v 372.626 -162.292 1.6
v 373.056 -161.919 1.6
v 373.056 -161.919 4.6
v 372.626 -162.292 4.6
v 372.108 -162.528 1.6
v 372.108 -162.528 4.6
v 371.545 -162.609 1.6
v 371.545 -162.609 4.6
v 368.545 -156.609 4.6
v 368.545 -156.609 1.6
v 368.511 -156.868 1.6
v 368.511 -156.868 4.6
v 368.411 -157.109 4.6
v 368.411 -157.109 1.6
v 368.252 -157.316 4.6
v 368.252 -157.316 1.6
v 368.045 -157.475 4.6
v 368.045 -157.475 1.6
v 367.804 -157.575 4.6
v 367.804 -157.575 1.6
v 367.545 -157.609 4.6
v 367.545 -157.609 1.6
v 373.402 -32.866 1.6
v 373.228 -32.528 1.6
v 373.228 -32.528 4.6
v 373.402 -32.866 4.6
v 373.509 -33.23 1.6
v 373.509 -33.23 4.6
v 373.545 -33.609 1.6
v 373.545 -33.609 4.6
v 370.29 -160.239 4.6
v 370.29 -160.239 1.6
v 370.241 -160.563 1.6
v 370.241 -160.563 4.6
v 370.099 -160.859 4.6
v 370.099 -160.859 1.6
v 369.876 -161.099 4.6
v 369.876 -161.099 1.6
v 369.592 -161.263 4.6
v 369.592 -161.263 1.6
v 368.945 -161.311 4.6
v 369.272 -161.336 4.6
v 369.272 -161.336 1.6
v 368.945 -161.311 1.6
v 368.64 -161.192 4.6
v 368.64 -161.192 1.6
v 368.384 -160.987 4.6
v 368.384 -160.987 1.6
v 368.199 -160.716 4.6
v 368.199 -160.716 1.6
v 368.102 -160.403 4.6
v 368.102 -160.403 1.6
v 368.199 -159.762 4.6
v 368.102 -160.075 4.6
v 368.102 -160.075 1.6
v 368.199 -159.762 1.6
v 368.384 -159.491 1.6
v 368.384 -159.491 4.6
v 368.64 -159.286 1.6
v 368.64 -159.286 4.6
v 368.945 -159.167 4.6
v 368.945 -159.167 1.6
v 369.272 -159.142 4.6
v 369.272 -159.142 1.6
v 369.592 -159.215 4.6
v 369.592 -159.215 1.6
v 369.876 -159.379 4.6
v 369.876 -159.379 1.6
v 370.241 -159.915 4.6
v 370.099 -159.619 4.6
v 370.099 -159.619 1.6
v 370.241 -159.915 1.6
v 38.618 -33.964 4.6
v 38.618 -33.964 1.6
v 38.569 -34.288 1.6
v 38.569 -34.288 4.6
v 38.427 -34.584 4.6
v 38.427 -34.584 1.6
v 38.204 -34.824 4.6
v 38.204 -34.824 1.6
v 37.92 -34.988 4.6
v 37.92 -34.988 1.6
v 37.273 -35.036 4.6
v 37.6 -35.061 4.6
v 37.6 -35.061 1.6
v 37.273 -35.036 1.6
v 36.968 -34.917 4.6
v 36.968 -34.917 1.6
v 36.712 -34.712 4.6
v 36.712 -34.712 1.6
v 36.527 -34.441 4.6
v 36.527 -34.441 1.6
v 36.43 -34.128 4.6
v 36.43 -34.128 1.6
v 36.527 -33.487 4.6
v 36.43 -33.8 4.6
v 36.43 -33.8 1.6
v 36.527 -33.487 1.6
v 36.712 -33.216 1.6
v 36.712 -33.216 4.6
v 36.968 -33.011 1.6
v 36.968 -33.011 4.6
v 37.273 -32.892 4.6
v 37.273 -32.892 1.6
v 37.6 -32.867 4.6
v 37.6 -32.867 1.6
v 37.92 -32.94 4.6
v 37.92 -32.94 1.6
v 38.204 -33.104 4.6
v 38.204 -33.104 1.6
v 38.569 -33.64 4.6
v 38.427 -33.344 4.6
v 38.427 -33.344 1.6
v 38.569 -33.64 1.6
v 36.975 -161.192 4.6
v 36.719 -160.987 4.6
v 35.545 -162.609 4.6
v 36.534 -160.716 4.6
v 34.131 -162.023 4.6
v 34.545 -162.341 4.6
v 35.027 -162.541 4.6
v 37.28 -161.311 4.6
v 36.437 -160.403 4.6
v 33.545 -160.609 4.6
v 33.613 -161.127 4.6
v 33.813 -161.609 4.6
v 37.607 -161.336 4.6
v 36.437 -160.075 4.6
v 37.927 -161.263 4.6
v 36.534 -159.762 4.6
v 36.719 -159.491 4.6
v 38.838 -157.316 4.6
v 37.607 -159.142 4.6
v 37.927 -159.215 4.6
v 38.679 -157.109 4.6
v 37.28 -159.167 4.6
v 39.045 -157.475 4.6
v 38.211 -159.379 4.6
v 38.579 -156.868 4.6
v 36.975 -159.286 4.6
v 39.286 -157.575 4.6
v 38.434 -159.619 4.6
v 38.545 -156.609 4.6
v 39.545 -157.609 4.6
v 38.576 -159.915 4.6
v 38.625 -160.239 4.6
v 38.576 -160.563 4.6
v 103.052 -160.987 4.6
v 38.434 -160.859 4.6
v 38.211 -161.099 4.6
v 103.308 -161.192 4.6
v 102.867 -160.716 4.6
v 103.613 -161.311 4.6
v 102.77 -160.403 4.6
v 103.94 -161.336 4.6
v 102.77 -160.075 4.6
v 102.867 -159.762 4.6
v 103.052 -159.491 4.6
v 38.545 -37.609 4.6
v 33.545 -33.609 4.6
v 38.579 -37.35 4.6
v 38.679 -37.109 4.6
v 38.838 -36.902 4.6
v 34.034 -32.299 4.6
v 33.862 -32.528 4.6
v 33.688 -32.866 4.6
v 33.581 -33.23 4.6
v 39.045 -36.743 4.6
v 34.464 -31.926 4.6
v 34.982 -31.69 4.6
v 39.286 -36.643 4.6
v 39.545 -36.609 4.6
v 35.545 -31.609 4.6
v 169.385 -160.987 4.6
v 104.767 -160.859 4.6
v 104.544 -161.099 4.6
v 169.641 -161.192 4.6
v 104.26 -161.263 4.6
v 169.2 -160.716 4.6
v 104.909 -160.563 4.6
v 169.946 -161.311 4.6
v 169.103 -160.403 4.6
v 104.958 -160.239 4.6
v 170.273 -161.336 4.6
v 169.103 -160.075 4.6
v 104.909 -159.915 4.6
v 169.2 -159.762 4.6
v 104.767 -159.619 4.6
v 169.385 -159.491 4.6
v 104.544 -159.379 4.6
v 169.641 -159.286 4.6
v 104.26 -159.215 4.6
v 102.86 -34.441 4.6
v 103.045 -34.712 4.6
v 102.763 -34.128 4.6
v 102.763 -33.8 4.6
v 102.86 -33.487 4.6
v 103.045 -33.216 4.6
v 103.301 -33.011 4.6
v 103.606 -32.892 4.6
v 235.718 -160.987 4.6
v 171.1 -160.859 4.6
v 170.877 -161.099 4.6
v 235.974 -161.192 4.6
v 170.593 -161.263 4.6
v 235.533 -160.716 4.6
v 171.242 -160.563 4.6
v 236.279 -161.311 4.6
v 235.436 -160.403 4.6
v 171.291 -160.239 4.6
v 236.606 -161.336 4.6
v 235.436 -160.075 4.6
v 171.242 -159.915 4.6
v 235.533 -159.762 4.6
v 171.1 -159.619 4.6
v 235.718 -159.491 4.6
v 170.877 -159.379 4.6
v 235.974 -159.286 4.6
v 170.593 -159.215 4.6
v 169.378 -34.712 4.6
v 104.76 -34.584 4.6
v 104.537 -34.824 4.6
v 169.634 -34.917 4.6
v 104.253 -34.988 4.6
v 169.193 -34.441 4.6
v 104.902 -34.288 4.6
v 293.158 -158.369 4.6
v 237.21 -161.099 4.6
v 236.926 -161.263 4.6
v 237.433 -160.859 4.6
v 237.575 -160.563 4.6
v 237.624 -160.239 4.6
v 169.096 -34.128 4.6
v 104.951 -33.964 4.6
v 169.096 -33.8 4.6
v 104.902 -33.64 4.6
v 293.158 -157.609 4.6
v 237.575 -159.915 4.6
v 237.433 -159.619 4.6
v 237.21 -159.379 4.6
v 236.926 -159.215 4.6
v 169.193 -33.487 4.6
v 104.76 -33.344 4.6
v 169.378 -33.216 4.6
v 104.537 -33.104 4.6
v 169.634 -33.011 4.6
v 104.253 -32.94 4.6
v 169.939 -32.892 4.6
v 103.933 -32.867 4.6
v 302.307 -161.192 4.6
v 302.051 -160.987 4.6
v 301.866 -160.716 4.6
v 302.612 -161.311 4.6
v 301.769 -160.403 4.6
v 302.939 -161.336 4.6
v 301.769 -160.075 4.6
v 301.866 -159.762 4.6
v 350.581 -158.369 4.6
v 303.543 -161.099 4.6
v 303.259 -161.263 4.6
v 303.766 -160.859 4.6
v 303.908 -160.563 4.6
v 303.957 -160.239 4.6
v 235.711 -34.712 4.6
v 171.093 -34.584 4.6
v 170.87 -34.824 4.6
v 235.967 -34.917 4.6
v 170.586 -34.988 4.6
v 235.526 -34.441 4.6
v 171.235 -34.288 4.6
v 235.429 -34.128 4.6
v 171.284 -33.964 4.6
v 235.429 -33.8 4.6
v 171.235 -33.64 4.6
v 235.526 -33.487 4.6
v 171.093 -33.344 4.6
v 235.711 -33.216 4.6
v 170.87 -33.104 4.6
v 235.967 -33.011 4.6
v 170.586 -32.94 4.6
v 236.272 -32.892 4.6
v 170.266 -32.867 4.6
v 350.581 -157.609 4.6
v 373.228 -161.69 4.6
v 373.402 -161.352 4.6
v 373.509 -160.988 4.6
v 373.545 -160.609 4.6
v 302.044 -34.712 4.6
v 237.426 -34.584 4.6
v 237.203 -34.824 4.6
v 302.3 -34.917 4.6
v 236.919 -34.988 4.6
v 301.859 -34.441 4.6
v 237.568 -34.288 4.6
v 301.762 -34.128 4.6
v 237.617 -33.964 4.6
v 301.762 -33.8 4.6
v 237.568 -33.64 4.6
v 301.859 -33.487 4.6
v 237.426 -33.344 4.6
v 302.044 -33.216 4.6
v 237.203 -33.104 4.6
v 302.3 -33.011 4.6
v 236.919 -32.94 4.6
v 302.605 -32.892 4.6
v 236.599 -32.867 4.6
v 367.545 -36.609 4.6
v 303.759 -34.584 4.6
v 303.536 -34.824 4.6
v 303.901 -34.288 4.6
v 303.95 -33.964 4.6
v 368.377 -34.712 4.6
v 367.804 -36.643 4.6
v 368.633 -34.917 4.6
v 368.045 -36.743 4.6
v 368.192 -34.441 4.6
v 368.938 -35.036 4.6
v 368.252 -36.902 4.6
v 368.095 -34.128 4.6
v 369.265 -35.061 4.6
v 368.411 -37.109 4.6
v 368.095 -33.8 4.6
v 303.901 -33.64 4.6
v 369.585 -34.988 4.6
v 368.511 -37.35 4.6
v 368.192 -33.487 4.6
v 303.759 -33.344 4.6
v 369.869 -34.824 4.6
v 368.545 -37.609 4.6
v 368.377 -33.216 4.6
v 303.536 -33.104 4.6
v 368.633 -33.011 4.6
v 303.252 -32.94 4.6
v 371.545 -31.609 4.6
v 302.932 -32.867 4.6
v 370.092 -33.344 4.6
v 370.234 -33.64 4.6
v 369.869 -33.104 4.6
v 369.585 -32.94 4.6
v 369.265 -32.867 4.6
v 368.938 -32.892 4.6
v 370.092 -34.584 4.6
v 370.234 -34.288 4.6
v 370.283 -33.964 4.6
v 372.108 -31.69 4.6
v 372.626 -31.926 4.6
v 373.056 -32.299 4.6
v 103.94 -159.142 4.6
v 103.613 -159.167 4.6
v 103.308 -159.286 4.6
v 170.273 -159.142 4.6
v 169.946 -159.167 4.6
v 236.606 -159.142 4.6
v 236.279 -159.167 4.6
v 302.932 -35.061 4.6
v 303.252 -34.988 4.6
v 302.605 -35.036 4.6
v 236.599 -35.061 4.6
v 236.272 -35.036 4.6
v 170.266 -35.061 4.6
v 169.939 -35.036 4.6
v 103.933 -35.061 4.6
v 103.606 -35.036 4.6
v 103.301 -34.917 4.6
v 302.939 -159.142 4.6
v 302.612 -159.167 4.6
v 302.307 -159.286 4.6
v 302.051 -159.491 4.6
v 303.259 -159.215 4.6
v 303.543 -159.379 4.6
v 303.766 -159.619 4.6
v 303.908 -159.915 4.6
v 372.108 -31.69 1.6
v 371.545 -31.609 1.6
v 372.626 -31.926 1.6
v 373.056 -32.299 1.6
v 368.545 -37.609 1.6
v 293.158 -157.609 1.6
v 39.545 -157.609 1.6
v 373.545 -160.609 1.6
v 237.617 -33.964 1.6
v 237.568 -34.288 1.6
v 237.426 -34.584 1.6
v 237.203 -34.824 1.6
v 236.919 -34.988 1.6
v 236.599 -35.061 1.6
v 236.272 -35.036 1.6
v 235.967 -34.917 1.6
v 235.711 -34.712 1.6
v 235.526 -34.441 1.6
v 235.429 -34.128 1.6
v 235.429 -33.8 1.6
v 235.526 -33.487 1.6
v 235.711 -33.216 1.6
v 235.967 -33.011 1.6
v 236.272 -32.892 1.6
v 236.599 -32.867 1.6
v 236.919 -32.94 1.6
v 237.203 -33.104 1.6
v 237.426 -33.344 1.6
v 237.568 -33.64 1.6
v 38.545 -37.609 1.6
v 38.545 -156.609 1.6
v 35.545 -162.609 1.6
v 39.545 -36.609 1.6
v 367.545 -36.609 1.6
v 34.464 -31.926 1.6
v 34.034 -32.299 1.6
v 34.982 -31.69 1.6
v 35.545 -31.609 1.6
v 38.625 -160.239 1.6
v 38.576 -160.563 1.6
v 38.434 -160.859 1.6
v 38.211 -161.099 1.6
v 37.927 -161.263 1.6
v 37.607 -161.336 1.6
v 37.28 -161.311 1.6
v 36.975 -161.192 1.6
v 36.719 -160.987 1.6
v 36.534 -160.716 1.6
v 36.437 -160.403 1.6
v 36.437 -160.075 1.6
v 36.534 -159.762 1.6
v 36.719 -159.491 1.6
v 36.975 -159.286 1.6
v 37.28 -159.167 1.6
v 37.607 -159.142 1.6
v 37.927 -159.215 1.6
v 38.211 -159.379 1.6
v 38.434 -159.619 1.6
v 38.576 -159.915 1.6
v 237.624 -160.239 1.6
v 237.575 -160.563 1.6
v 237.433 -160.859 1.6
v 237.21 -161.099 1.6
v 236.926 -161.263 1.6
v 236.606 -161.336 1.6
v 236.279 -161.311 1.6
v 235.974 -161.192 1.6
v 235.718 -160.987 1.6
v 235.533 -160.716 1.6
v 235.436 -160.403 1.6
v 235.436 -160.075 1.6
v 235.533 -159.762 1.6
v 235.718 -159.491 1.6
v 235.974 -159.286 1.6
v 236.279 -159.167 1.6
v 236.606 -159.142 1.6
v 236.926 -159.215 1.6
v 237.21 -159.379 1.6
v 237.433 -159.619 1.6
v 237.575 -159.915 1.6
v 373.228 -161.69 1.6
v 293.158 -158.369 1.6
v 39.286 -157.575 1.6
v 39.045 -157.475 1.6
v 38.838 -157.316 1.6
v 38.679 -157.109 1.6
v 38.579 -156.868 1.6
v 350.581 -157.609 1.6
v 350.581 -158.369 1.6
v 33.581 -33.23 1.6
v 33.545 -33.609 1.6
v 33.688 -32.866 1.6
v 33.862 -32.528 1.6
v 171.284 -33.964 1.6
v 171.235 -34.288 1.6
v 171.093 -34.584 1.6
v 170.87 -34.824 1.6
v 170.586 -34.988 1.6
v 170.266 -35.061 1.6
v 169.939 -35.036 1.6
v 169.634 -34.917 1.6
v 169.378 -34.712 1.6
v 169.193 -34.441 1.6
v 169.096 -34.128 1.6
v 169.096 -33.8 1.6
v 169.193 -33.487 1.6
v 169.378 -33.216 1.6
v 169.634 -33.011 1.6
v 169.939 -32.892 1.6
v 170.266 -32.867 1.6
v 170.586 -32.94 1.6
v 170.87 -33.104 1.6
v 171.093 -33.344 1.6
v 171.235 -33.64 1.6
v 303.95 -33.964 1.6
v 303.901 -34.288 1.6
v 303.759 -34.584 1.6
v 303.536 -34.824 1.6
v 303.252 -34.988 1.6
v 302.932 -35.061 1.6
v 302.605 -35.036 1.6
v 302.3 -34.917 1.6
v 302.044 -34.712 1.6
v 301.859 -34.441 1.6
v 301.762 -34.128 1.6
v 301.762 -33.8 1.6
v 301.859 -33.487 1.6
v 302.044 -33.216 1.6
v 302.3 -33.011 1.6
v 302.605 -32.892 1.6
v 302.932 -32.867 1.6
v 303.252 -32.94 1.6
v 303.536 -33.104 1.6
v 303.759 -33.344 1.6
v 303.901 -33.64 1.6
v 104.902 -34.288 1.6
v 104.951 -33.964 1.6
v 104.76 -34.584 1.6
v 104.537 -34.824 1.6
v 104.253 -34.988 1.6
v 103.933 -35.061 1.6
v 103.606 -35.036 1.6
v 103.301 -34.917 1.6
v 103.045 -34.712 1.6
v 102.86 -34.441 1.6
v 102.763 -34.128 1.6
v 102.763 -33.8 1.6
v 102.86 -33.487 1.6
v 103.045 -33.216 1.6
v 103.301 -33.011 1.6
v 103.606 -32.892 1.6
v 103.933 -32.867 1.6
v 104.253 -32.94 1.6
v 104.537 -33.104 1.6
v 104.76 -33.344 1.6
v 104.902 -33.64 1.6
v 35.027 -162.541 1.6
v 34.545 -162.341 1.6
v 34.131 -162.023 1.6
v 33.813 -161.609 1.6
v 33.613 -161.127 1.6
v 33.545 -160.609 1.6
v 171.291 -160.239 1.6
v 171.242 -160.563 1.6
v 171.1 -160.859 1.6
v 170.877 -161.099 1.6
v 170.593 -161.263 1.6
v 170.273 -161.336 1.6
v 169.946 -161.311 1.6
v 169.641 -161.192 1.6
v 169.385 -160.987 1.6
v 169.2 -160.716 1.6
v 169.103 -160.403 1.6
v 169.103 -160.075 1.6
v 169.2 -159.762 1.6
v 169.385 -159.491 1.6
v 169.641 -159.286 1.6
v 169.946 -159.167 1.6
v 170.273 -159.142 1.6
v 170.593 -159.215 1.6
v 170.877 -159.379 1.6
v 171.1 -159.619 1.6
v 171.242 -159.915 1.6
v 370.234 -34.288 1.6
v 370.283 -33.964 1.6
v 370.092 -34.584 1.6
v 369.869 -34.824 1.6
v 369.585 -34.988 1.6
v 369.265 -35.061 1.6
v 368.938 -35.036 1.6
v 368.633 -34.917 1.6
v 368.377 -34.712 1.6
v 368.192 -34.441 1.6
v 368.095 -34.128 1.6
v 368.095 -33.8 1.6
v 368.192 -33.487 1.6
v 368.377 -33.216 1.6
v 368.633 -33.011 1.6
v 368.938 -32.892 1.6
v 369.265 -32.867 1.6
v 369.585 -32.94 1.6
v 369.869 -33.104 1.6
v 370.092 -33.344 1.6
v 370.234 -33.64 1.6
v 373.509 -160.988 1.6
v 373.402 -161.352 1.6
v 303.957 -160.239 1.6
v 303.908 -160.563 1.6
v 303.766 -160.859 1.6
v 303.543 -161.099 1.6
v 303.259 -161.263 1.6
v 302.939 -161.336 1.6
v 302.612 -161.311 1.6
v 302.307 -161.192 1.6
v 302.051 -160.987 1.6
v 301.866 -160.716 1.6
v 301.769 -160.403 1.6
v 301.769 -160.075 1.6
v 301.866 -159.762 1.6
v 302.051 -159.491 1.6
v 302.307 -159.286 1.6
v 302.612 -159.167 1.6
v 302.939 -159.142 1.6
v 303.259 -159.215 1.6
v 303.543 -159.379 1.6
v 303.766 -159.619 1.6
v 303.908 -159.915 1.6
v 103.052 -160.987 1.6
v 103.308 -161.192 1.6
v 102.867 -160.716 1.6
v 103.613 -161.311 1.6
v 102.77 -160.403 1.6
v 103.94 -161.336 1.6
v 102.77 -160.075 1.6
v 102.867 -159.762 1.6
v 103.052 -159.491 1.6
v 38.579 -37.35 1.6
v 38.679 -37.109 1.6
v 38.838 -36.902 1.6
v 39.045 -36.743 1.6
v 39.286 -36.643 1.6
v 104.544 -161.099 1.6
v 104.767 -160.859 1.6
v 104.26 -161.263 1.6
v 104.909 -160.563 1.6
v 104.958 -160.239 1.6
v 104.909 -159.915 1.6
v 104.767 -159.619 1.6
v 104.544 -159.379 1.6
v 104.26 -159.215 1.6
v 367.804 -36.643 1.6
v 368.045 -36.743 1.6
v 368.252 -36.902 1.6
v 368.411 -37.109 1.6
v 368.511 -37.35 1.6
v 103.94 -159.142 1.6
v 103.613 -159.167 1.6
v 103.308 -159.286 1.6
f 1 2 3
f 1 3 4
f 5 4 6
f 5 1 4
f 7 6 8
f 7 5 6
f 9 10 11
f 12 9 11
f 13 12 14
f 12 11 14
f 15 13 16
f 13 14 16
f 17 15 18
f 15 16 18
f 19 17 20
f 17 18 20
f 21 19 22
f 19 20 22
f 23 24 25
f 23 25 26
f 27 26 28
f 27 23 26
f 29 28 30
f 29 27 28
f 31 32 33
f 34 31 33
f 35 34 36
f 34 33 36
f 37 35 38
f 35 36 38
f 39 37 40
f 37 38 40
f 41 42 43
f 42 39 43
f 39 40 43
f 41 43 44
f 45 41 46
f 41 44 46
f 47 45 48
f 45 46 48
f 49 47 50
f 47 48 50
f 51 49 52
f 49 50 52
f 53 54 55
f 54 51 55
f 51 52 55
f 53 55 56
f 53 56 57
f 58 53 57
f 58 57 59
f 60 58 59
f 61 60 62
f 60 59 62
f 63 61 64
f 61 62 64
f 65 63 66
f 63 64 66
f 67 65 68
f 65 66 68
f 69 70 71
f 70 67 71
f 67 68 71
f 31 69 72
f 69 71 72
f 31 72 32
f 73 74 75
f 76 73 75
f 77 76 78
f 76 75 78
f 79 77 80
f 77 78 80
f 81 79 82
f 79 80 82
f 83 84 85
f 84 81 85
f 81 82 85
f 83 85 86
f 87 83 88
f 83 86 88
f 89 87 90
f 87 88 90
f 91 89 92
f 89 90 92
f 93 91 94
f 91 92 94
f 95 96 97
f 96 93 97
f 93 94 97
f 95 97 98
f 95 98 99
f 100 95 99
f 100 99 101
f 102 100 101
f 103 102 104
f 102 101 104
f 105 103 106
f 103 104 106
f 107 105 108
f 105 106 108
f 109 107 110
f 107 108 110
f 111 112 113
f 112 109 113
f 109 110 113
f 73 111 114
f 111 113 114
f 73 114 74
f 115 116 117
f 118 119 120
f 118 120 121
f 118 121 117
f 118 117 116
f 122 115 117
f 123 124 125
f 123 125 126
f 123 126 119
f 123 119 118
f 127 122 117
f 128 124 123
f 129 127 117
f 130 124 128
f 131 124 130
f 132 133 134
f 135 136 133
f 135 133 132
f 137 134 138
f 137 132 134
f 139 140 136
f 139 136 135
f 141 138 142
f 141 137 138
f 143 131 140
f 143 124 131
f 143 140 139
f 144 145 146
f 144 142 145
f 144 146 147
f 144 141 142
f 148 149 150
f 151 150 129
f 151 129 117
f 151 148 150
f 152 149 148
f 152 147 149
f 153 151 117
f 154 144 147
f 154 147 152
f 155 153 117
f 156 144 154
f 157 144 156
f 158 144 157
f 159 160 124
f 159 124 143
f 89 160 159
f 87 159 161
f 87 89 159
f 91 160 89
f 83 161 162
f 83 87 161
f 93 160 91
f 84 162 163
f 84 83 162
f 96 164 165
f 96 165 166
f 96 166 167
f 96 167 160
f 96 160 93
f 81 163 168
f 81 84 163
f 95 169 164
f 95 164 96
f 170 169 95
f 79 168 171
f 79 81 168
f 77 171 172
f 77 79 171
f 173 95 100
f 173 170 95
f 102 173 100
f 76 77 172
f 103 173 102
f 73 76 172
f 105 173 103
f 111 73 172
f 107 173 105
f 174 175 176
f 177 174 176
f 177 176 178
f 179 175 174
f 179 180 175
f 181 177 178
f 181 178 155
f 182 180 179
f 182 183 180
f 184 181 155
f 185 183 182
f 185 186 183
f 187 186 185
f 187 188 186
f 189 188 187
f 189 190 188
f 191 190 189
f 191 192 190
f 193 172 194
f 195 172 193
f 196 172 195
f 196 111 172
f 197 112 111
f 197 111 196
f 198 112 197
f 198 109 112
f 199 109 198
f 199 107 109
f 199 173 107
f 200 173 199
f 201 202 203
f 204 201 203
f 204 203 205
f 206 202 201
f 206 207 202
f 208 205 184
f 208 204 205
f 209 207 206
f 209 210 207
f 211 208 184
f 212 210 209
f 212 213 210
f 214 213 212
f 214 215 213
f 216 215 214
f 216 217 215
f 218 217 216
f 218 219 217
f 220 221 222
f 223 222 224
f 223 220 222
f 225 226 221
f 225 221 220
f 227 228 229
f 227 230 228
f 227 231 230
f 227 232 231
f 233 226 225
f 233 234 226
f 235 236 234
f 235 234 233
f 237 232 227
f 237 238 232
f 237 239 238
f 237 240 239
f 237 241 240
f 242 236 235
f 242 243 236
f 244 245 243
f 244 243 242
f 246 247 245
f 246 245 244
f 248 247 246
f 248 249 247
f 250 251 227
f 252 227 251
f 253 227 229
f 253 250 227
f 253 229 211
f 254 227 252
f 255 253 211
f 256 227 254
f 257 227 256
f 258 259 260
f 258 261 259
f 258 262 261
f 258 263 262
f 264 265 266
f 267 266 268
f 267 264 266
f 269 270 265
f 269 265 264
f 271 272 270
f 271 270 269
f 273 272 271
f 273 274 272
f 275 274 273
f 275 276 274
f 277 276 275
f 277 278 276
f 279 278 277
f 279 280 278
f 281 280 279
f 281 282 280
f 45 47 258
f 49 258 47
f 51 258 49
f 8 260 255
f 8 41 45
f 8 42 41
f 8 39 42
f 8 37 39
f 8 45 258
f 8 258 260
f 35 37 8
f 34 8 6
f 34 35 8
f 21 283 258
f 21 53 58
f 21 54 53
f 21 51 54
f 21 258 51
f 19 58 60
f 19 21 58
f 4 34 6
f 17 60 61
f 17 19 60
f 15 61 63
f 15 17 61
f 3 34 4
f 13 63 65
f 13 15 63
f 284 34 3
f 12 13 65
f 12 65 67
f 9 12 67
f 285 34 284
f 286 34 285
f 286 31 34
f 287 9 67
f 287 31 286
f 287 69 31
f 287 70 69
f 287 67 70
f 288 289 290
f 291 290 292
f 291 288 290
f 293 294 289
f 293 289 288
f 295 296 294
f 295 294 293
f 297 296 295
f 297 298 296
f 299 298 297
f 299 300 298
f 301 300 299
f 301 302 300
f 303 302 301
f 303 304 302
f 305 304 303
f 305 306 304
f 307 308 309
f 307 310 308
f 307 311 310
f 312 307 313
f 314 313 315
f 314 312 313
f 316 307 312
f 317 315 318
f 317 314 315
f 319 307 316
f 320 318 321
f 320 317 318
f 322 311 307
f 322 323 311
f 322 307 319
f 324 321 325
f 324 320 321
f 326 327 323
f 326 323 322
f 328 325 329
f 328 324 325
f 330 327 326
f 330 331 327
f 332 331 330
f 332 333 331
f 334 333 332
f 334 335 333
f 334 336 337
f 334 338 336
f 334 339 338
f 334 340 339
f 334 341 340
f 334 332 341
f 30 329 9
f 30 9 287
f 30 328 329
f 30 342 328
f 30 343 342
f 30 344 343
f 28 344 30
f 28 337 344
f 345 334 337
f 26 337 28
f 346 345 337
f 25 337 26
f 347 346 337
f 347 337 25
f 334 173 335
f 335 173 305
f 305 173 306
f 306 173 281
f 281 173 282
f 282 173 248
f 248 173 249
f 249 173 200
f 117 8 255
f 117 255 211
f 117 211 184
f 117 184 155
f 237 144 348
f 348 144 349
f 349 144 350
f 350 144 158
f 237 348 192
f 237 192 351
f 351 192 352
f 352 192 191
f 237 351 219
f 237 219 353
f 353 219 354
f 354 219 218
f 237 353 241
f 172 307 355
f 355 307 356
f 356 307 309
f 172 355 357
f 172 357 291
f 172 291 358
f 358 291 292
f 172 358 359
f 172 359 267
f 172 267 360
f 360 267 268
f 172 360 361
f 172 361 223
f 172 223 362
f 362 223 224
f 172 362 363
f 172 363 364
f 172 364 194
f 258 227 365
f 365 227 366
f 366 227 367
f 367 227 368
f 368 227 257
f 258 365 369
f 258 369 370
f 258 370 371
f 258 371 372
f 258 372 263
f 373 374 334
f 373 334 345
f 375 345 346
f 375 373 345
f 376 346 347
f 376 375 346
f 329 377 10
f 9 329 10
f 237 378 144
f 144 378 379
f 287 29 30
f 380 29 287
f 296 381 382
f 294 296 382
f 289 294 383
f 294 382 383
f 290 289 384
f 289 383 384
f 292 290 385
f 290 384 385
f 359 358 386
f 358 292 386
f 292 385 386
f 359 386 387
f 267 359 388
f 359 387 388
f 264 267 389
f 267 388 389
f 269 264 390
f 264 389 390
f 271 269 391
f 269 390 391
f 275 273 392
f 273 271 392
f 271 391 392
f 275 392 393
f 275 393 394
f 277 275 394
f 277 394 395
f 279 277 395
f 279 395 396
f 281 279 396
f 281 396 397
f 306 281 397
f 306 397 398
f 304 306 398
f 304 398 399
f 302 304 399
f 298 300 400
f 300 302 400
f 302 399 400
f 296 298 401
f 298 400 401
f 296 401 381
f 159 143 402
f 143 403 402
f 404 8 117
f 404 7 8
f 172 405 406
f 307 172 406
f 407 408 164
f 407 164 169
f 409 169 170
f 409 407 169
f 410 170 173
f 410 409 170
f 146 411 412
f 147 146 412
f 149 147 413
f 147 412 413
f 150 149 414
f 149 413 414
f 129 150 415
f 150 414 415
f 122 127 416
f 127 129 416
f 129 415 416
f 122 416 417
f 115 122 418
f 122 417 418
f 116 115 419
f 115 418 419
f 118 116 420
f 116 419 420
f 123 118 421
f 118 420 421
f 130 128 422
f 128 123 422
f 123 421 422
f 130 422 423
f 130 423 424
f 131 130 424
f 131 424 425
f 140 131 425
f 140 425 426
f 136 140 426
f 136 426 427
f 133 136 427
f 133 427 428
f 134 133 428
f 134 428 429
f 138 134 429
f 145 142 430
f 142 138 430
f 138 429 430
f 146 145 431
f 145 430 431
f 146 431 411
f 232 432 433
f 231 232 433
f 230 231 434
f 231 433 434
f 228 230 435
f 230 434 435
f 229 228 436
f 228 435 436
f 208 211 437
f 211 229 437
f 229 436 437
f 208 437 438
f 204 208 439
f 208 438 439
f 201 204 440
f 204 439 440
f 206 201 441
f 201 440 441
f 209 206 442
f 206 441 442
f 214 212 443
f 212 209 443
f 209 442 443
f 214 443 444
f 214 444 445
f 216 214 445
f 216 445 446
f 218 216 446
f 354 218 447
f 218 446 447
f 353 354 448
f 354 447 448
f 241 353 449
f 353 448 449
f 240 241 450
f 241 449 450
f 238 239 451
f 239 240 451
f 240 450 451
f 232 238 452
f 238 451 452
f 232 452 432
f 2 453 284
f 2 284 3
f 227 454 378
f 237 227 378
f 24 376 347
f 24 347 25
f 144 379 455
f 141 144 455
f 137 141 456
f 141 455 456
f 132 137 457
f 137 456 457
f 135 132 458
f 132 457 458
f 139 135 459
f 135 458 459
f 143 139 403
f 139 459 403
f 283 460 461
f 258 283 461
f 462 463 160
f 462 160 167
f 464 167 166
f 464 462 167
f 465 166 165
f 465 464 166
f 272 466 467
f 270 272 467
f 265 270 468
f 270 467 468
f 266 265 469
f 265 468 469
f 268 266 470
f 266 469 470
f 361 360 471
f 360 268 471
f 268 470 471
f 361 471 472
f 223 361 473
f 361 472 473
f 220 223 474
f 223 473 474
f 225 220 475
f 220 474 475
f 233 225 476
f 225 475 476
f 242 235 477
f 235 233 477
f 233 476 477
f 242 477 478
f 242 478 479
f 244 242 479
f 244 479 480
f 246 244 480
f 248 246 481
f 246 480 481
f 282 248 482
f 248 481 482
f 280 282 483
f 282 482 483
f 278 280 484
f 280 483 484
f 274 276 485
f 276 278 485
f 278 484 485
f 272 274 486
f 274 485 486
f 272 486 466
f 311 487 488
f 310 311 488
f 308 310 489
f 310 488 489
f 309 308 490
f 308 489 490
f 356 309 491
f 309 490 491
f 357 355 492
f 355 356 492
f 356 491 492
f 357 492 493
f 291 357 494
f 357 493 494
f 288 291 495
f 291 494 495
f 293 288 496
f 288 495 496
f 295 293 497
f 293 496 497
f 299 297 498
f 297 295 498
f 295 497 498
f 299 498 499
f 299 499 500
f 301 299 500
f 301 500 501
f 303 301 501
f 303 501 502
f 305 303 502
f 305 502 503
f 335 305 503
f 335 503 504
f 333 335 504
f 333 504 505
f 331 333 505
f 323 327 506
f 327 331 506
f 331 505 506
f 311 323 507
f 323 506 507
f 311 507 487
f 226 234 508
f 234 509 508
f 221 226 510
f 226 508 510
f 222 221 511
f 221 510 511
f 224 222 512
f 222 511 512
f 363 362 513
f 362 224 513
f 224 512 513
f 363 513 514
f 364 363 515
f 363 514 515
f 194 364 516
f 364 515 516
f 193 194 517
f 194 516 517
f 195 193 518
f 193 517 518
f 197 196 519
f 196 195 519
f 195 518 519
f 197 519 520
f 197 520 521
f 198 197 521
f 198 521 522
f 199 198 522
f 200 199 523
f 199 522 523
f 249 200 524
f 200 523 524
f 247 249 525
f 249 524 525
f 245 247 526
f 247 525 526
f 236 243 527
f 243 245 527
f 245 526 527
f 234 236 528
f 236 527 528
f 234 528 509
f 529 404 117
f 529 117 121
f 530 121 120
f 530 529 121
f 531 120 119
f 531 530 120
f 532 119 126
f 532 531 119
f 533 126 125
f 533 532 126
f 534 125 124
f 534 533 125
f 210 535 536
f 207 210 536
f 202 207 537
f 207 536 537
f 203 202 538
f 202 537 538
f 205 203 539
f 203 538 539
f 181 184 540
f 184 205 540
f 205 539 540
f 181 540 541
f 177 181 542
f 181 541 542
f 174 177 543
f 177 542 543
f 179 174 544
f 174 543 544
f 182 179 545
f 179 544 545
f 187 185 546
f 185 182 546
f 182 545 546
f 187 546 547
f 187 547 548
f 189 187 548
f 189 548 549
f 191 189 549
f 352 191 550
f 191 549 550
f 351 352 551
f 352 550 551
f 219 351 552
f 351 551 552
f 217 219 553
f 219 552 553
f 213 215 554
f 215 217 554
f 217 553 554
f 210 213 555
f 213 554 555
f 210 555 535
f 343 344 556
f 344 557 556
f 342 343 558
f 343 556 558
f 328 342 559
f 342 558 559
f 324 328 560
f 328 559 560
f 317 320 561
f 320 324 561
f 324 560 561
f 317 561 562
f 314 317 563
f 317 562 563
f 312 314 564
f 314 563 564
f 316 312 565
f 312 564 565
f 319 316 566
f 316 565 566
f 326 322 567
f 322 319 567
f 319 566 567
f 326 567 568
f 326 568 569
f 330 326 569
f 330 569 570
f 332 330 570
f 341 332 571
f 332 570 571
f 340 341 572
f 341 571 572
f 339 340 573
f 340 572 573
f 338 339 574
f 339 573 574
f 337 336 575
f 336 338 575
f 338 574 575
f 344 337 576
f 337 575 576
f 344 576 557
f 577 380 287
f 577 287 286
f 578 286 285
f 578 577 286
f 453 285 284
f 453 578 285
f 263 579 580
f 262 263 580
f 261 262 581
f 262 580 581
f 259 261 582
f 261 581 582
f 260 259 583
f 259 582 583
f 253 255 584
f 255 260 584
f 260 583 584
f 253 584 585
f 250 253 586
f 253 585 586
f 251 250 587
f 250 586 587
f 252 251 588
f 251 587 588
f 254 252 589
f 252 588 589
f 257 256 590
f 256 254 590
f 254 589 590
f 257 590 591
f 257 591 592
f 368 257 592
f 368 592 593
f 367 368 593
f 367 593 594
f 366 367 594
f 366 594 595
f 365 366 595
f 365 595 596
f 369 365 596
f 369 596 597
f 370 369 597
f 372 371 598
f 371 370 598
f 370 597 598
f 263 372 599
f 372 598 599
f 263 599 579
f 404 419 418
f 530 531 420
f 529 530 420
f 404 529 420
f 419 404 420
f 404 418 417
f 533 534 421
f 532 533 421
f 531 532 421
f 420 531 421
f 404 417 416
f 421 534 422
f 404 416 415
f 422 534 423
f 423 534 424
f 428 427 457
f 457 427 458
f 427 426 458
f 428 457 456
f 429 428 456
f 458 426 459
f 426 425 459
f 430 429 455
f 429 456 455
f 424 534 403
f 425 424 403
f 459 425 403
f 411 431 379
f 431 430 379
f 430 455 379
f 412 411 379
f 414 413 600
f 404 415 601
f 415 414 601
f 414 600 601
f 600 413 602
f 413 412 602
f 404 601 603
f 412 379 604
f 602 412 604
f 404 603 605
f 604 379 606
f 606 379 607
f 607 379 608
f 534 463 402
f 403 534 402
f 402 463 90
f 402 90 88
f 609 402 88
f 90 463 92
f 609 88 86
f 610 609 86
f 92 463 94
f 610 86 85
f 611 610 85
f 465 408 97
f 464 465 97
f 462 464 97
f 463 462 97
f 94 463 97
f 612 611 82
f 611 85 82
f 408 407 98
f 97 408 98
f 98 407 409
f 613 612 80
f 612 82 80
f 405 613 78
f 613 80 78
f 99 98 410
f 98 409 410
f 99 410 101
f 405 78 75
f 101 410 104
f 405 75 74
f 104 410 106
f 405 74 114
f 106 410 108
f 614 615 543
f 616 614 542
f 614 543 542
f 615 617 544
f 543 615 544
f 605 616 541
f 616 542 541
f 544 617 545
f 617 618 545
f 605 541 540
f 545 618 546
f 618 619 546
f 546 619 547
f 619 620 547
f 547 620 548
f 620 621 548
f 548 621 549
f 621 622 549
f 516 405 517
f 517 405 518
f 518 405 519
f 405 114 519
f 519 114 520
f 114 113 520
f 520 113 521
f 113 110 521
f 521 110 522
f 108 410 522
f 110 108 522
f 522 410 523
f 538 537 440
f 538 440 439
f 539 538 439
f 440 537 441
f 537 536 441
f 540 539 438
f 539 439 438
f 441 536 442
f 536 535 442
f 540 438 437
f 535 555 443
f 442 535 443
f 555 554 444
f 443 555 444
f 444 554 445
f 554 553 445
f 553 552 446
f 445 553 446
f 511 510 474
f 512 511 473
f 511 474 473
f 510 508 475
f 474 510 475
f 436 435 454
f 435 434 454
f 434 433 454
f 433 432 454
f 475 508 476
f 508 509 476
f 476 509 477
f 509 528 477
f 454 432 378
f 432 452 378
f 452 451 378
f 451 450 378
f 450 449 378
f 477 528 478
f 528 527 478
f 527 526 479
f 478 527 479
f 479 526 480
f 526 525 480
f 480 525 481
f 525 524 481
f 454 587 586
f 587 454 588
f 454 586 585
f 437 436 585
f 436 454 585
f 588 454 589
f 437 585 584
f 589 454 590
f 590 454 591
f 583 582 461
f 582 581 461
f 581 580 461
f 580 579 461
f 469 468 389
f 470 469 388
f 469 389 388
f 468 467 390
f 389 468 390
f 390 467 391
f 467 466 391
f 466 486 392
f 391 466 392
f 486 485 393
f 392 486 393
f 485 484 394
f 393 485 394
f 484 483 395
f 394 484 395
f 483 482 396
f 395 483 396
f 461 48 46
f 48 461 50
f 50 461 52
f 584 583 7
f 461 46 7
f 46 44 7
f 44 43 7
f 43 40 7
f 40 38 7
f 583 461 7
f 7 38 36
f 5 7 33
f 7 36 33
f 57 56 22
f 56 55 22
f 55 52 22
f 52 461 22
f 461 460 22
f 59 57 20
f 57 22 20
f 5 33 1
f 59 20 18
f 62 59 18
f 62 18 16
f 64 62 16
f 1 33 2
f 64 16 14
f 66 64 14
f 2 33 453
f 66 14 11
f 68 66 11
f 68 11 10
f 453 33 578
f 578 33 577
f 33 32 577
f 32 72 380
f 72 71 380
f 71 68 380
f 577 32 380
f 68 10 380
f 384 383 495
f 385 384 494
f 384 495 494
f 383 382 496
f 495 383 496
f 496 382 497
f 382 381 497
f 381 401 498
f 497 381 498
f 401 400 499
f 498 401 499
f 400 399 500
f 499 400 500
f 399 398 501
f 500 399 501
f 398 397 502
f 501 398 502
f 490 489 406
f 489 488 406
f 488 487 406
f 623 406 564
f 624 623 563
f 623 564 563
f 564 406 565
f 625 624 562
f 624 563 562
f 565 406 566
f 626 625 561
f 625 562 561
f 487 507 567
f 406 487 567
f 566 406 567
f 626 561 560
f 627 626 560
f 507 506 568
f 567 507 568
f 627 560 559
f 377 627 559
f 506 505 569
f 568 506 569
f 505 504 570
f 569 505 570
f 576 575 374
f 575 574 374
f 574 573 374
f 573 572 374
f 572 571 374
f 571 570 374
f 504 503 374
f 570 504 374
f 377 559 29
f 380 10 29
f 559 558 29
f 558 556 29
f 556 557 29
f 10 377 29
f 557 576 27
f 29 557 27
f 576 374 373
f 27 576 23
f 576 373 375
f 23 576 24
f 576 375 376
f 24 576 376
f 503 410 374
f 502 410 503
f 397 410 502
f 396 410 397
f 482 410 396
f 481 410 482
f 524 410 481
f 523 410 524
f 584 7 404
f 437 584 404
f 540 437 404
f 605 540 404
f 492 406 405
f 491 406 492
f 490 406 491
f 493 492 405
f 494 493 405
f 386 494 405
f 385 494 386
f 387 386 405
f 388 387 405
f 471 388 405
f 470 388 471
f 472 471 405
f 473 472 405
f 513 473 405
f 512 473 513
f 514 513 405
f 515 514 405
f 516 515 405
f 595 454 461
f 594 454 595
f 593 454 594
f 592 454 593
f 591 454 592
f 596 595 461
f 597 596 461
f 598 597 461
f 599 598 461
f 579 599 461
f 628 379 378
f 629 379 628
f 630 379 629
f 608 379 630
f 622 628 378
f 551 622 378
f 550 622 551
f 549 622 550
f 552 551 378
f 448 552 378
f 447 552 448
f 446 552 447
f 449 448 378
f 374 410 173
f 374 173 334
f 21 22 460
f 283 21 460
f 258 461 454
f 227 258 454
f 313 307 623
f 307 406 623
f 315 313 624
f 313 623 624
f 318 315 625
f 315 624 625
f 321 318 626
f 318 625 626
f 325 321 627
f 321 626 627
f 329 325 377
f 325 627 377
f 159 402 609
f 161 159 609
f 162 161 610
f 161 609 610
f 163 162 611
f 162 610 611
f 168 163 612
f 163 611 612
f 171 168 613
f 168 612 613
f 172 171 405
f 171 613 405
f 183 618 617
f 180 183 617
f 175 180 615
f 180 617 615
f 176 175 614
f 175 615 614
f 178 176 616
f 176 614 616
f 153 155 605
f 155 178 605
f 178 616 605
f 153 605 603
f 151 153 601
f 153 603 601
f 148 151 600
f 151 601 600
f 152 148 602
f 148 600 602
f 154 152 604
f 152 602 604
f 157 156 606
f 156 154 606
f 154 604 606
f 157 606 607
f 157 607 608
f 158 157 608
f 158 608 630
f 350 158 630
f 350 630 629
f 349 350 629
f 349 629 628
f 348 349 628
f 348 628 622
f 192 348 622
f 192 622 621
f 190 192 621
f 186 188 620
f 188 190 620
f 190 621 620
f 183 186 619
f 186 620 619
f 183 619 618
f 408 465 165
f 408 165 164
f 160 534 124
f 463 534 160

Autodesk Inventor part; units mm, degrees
ref_plane "YZ Plane" through (0, 0, 0) normal (1, 0, 0) x (0, 1, 0)
ref_plane "XZ Plane" through (0, 0, 0) normal (0, 1, 0) x (-1, 0, 0)
ref_plane "XY Plane" through (0, 0, 0) normal (0, 0, 1) x (1, 0, 0)
ref_plane "Work Plane2" through (35.545, -31.609, 1.6) normal (0, 0, 1) x (1, 0, 0)
ref_plane "Work Plane1" through (35.545, -31.609, 1.6) normal (0, 0, 1) x (1, 0, 0)
sketch "Sketch1" plane through (35.545, -31.609, 1.6) normal (0, 0, 1) x (1, 0, 0)
  line L0 (0, 0) -> (336, 0) projected
  line L1 (-2, -129) -> (-2, -2) projected
  line L2 (-1.6825, -0.9187) -> (-1.5115, -0.6903) projected
  arc A0 (0, 0) -> (-2, -2) centre (0, -2) ccw
  line L3 (338, -2) -> (338, -129) projected
  line L4 (337.5115, -0.6903) -> (337.6825, -0.9187) projected
  arc A1 (338, -2) -> (336, 0) centre (336, -2) ccw
  line L5 (336, -131) -> (0, -131) projected
  line L6 (337.6825, -130.0813) -> (337.5115, -130.3097) projected
  arc A2 (336, -131) -> (338, -129) centre (336, -129) ccw
  arc A3 (-2, -129) -> (0, -131) centre (0, -129) ccw
  circle A4 centre (1.98, -128.63) radius 1.1 projected
  circle A5 centre (1.98, -128.63) radius 1.1
  circle A6 centre (68.313, -128.63) radius 1.1 projected
  circle A7 centre (134.646, -128.63) radius 1.1 projected
  circle A8 centre (134.646, -128.63) radius 1.1
  circle A9 centre (68.313, -128.63) radius 1.1
  circle A10 centre (200.979, -128.63) radius 1.1 projected
  circle A11 centre (267.312, -128.63) radius 1.1 projected
  circle A12 centre (333.645, -128.63) radius 1.1 projected
  circle A13 centre (333.645, -128.63) radius 1.1
  circle A14 centre (267.312, -128.63) radius 1.1
  circle A15 centre (200.979, -128.63) radius 1.1
  circle A16 centre (333.638, -2.355) radius 1.1 projected
  circle A17 centre (1.973, -2.355) radius 1.1 projected
  circle A18 centre (68.306, -2.355) radius 1.1 projected
  circle A19 centre (134.639, -2.355) radius 1.1 projected
  circle A20 centre (200.972, -2.355) radius 1.1 projected
  circle A21 centre (267.305, -2.355) radius 1.1 projected
  circle A22 centre (333.645, -2.355) radius 1.093
  circle A23 centre (267.305, -2.355) radius 1.1
  circle A24 centre (200.972, -2.355) radius 1.1
  circle A25 centre (134.639, -2.355) radius 1.1
  circle A26 centre (68.306, -2.355) radius 1.1
  circle A27 centre (1.973, -2.355) radius 1.1
  line L7 (3, -4.2357) -> (125.2758, -4.2357) construction
  line L8 (4, -5) -> (332, -5)
  line L9 (333, -6) -> (333, -125)
  line L10 (332, -126) -> (4, -126)
  line L11 (3, -125) -> (3, -6)
  arc A28 (4, -5) -> (3, -6) centre (4, -6) ccw
  arc A29 (333, -6) -> (332, -5) centre (332, -6) ccw
  arc A30 (332, -126) -> (333, -125) centre (332, -125) ccw
  arc A31 (3, -125) -> (4, -126) centre (4, -125) ccw
  circle A32 centre (320.737, -95.692) radius 0.175 projected
  line L12 (257.6125, -126) -> (315.0362, -126)
  line L13 (315.0362, -126) -> (315.0362, -126.7604)
  line L14 (315.0362, -126.7604) -> (257.6125, -126.7604)
  line L15 (257.6125, -126.7604) -> (257.6125, -126)
  point P0 (-35.545, 31.609)
  point P1 (-1.5115, -130.3097)
  point P2 (162.5077, 0)
  point P3 (162.5077, -5)
  point P4 (173.4174, -5)
  point P5 (173.4174, 0)
  point P6 (333, -88.192)
  point P7 (338, -88.192)
  point P8 (333, -102.192)
  point P9 (338, -102.192)
  point P10 (335.5, -88.192)
  point P11 (0, -131)
  point P12 (337.6825, -130.0813)
  point P13 (-1.6825, -0.9187)
  point P14 (337.6825, -0.9187)
  dimension "d2" = 5
  dimension "d3" = 5
  dimension "d4" = 5
  dimension "d5" = 5
  dimension "d6" = 1
  dimension "d7" = 1
  dimension "d8" = 1
  dimension "d9" = 1
extrude "Extrusion3" add sketch "Sketch1" along normal blind 3 contours L0 A1 L4 L3 A2 L6 L5 A3 L1 A0 L2
properties part number "top-layer"
